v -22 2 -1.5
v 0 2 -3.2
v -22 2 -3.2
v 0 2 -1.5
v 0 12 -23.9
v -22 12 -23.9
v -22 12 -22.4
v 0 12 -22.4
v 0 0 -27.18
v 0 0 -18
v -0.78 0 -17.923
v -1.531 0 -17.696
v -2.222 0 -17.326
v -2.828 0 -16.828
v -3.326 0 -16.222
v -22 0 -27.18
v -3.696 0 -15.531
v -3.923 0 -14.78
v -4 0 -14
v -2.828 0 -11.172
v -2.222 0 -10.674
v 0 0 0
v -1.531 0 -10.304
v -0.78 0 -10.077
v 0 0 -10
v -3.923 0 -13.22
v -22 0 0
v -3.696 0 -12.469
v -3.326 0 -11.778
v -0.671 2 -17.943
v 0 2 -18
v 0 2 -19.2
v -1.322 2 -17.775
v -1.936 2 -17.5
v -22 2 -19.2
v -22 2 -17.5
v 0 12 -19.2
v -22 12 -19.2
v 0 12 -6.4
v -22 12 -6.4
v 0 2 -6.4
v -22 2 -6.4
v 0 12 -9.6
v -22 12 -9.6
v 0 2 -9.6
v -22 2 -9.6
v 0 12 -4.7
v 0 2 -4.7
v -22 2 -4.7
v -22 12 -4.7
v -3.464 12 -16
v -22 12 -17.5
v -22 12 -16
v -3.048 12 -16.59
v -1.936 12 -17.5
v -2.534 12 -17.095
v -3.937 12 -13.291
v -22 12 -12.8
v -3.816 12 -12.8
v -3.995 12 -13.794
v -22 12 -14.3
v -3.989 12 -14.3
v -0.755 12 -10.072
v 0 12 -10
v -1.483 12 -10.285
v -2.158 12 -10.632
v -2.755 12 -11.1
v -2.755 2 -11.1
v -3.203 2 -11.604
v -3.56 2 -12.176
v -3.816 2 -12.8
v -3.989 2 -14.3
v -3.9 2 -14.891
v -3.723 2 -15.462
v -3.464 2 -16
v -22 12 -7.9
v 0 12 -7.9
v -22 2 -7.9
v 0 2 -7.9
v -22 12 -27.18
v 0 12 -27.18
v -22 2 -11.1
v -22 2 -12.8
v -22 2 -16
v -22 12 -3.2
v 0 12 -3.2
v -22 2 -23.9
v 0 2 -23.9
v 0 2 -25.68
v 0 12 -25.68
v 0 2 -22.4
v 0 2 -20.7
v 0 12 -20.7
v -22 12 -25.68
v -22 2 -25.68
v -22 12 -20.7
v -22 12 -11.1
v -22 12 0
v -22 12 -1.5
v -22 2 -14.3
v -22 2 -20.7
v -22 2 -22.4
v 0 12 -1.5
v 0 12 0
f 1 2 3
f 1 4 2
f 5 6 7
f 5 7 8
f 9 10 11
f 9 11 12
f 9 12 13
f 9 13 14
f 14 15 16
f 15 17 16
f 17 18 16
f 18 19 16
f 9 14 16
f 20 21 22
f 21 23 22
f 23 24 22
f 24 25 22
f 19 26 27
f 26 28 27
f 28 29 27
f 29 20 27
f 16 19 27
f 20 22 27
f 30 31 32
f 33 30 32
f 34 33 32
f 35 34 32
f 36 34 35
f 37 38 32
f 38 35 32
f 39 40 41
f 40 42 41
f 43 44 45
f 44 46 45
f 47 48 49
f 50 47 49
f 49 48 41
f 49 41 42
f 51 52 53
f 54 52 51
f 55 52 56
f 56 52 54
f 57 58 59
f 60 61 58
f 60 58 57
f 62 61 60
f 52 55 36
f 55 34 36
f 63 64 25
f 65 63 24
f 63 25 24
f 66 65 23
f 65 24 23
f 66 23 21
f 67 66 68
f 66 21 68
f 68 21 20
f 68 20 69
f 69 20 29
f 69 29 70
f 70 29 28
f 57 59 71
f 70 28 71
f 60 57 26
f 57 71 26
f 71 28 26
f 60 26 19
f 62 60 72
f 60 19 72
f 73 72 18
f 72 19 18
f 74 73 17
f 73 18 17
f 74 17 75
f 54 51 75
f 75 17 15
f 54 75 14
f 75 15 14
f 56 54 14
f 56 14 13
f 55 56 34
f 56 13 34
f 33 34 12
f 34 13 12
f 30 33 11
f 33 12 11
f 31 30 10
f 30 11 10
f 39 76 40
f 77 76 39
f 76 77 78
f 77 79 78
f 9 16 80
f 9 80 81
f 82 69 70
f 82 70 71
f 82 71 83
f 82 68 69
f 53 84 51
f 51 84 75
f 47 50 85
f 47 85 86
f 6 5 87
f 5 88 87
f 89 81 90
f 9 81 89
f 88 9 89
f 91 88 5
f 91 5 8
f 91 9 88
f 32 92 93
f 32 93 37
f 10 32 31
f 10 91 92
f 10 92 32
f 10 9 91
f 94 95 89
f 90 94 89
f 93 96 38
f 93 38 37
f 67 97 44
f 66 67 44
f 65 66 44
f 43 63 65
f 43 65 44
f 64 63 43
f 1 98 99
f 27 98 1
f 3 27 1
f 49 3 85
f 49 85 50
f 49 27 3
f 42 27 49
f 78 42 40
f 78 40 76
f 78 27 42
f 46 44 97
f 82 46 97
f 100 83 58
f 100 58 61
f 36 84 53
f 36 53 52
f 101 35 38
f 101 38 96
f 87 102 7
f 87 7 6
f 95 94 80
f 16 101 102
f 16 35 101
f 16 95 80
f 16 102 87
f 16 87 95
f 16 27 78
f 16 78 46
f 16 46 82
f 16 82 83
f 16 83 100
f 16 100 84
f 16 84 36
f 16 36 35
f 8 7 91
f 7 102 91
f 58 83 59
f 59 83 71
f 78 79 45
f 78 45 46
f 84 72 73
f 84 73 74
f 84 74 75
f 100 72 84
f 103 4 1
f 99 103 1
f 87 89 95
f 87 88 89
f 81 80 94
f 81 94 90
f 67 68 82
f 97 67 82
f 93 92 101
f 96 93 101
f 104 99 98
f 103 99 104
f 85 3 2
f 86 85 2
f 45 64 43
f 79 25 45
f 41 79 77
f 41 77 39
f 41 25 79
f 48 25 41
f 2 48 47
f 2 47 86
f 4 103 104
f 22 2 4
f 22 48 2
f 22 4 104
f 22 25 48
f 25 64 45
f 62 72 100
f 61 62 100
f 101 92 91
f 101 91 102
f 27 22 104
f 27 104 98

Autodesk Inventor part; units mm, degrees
ref_plane "YZ Plane" through (0, 0, 0) normal (1, 0, 0) x (0, 1, 0)
ref_plane "XZ Plane" through (0, 0, 0) normal (0, 1, 0) x (-1, 0, 0)
ref_plane "XY Plane" through (0, 0, 0) normal (0, 0, 1) x (1, 0, 0)
sketch "Sketch2" plane through (0, 0, 0) normal (0, 1, 0) x (-1, 0, 0)
  line L0 (0, 0) -> (22, 0)
  line L1 (22, 0) -> (22, -27.18)
  line L2 (22, -27.18) -> (0, -27.18)
  line L3 (0, -27.18) -> (0, 0)
  dimension "d0" = 27.18
  dimension "d1" = 22
extrude "Extrusion1" add sketch "Sketch2" along normal blind 2
sketch "Sketch3" plane through (0, 2, 0) normal (0, 1, 0) x (1, 0, 0)
  line L0 (-22, 0) -> (0, 0) projected
  line L1 (0, 0) -> (0, 27.18) projected
  line L2 (0, 27.18) -> (-22, 27.18) projected
  line L3 (-22, 27.18) -> (-22, 0) projected
  line L4 (-22, 0) -> (0, 0) projected
  line L5 (0, 0) -> (0, 27.18) projected
  line L6 (-22, 0) -> (0, 0)
  line L7 (0, 0) -> (0, 1.5)
  line L8 (0, 1.5) -> (-22, 1.5)
  line L9 (-22, 1.5) -> (-22, 0)
  line L10 (-22, 3.2) -> (0, 3.2)
  line L11 (0, 3.2) -> (0, 4.7)
  line L12 (0, 4.7) -> (-22, 4.7)
  line L13 (-22, 4.7) -> (-22, 3.2)
  line L14 (-22, 6.4) -> (0, 6.4)
  line L15 (0, 6.4) -> (0, 7.9)
  line L16 (0, 7.9) -> (-22, 7.9)
  line L17 (-22, 7.9) -> (-22, 6.4)
  line L18 (-22, 9.6) -> (0, 9.6)
  line L19 (0, 9.6) -> (0, 11.1)
  line L20 (0, 11.1) -> (-22, 11.1)
  line L21 (-22, 11.1) -> (-22, 9.6)
  line L22 (-22, 12.8) -> (0, 12.8)
  line L23 (0, 12.8) -> (0, 14.3)
  line L24 (0, 14.3) -> (-22, 14.3)
  line L25 (-22, 14.3) -> (-22, 12.8)
  line L26 (-22, 16) -> (0, 16)
  line L27 (0, 16) -> (0, 17.5)
  line L28 (0, 17.5) -> (-22, 17.5)
  line L29 (-22, 17.5) -> (-22, 16)
  line L30 (-22, 19.2) -> (0, 19.2)
  line L31 (0, 19.2) -> (0, 20.7)
  line L32 (0, 20.7) -> (-22, 20.7)
  line L33 (-22, 20.7) -> (-22, 19.2)
  line L34 (-22, 22.4) -> (0, 22.4)
  line L35 (0, 22.4) -> (0, 23.9)
  line L36 (0, 23.9) -> (-22, 23.9)
  line L37 (-22, 23.9) -> (-22, 22.4)
  line L38 (-22, 27.18) -> (-22, 0) projected
  line L39 (0, 27.18) -> (-22, 27.18)
  line L40 (-22, 27.18) -> (-22, 25.68)
  line L41 (-22, 25.68) -> (0, 25.68)
  line L42 (0, 25.68) -> (0, 27.18)
  dimension "d4" = 1.5
  dimension "d7" = 3.2
  dimension "d12" = 1.5
extrude "Extrusion2" add sketch "Sketch3" along normal blind 10 contours L3 L8 L1 L0 | L3 L12 L1 L10 | L3 L16 L1 L14 | L3 L20 L1 L18 | L3 L24 L1 L22 | L3 L28 L1 L26 | L3 L32 L1 L30 | L3 L36 L1 L34 | L3 L2 L1 L41
sketch "Sketch4" plane through (0, 0, 0) normal (0, -1, 0) x (1, 0, 0)
  circle A0 centre (0, -14) radius 4
  line L0 (0, -27.18) -> (0, 0)
  dimension "d15" = 8
  dimension "d16" = 14
extrude "Extrusion3" cut sketch "Sketch4" against normal through all
properties part number "Heatsink" material "Aluminum 6061"
